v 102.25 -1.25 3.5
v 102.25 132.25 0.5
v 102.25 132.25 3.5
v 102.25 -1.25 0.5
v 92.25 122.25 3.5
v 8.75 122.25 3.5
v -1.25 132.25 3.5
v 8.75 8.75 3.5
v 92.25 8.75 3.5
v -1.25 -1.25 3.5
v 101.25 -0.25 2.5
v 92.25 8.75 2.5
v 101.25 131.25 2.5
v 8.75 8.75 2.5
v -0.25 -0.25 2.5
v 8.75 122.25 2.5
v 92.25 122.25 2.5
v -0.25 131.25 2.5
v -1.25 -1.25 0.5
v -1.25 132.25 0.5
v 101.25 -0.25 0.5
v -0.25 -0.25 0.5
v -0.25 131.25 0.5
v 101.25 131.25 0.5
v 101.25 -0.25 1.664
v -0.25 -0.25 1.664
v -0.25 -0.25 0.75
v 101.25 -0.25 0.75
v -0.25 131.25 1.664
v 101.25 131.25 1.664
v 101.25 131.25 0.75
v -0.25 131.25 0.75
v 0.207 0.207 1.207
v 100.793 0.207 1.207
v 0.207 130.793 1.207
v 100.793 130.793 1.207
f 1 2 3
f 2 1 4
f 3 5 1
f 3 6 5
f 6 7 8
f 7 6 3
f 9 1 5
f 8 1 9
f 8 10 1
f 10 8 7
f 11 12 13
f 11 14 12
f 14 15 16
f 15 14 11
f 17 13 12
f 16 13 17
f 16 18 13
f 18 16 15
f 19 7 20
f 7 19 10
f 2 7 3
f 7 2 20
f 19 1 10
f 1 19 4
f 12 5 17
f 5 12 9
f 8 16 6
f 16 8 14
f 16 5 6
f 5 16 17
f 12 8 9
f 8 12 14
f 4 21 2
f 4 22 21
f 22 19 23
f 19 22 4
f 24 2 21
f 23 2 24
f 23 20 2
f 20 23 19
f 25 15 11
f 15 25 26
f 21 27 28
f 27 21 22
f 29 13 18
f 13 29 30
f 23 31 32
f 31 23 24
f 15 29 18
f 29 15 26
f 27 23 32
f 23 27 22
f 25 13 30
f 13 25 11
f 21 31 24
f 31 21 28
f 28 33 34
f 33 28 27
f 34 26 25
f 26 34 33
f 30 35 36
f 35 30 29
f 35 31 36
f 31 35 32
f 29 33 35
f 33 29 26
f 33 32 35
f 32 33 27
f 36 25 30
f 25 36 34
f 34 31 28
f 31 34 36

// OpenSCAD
width = 98;
length = 128;
thickness = 1;
gap = 0.5;

open = "nowhere"; // might be top|bottom|left|right

outerWidth = width + (2 * thickness) + (2 * gap);
outerLength = length + (2 * thickness) + (2 * gap);


module lowerNotch(exact = false) {
    // lower negative notch
    stretch = exact ? thickness : 10;
    move = stretch / 2;

    translate([0, -thickness/2, thickness/2]) {
        rotate([45, 0, 0])
        translate([-move,0,0])
        cube([outerWidth+stretch,thickness,thickness]);
    }

    // upper negative notch
    translate([0, outerLength+thickness/2, thickness/2]) {
        rotate([45, 0, 0])
        translate([-move,0,0])
        cube([outerWidth+stretch,thickness,thickness]);
    }

    // left negative notch
    rotate([0, 0, 90]) {
        translate([0, thickness/2, thickness/2]) {
            rotate([45, 0, 0])
            translate([-move,0,0])
            cube([outerLength+stretch,thickness,thickness]);
        }
    }

    // left negative notch
    rotate([0, 0, 90]) {
        translate([0, -outerWidth-(thickness/2), thickness/2]) {
            rotate([45, 0, 0])
            translate([-move,0,0])
            cube([outerLength+stretch,thickness,thickness]);
        }
    }
}


module lowerPlate() {
    difference() {
        union() {
            // lower plate
            cube([outerWidth, outerLength, thickness]);

            // all lower borders
            translate([0, 0, thickness]) {
                if (open != "bottom"){
                    // lower border
                    cube([outerWidth,thickness,thickness]);
                }

                if (open != "top"){
                    // upper border
                    translate([0, outerLength - thickness, 0]) {
                        cube([outerWidth,thickness,thickness]);
                    }
                }

                if (open != "left"){
                    // left border
                    cube([thickness,outerLength,thickness]);
                }

                if (open != "rigth"){
                    // right border
                    translate([outerWidth - thickness, 0, 0]) {
                        cube([thickness,outerLength,thickness]);
                    }
                }
            }
        };
        lowerNotch();
    }
}


module upperPlate() {
    upperGap = 0.5;
    frameBorder = 10;
    totalAddition = (2*thickness) + upperGap;

    upperOuterWidth = outerWidth + totalAddition;
    upperOuterLength = outerLength + totalAddition;
    
    
    translate([-totalAddition/2,-totalAddition/2,(thickness*2)+0.5]) {
        
        difference() {
            // upper plate
            cube([upperOuterWidth, upperOuterLength, thickness]);

            translate([frameBorder, frameBorder, -1])
            cube([upperOuterWidth-frameBorder*2, upperOuterLength-frameBorder*2, thickness+2]);
        }


    // all upper borders
    translate([0, 0, -thickness*2]) {
        if (open != "bottom"){
            // lower border
            cube([upperOuterWidth,thickness,thickness*2]);
        }


        if (open != "top"){
            // upper border
            translate([0, upperOuterLength - thickness, 0]) {
                cube([upperOuterWidth,thickness,thickness*2]);
            }
        }

        if (open != "left"){
            // left border
            cube([thickness,upperOuterLength,thickness*2]);
        }

        if (open != "rigth"){
            // right border
            translate([upperOuterWidth - thickness, 0, 0]) {
                cube([thickness,upperOuterLength,thickness*2]);
            }
        }
    }
    }



    lowerNotch(true);
}

lowerPlate();
!upperPlate();
